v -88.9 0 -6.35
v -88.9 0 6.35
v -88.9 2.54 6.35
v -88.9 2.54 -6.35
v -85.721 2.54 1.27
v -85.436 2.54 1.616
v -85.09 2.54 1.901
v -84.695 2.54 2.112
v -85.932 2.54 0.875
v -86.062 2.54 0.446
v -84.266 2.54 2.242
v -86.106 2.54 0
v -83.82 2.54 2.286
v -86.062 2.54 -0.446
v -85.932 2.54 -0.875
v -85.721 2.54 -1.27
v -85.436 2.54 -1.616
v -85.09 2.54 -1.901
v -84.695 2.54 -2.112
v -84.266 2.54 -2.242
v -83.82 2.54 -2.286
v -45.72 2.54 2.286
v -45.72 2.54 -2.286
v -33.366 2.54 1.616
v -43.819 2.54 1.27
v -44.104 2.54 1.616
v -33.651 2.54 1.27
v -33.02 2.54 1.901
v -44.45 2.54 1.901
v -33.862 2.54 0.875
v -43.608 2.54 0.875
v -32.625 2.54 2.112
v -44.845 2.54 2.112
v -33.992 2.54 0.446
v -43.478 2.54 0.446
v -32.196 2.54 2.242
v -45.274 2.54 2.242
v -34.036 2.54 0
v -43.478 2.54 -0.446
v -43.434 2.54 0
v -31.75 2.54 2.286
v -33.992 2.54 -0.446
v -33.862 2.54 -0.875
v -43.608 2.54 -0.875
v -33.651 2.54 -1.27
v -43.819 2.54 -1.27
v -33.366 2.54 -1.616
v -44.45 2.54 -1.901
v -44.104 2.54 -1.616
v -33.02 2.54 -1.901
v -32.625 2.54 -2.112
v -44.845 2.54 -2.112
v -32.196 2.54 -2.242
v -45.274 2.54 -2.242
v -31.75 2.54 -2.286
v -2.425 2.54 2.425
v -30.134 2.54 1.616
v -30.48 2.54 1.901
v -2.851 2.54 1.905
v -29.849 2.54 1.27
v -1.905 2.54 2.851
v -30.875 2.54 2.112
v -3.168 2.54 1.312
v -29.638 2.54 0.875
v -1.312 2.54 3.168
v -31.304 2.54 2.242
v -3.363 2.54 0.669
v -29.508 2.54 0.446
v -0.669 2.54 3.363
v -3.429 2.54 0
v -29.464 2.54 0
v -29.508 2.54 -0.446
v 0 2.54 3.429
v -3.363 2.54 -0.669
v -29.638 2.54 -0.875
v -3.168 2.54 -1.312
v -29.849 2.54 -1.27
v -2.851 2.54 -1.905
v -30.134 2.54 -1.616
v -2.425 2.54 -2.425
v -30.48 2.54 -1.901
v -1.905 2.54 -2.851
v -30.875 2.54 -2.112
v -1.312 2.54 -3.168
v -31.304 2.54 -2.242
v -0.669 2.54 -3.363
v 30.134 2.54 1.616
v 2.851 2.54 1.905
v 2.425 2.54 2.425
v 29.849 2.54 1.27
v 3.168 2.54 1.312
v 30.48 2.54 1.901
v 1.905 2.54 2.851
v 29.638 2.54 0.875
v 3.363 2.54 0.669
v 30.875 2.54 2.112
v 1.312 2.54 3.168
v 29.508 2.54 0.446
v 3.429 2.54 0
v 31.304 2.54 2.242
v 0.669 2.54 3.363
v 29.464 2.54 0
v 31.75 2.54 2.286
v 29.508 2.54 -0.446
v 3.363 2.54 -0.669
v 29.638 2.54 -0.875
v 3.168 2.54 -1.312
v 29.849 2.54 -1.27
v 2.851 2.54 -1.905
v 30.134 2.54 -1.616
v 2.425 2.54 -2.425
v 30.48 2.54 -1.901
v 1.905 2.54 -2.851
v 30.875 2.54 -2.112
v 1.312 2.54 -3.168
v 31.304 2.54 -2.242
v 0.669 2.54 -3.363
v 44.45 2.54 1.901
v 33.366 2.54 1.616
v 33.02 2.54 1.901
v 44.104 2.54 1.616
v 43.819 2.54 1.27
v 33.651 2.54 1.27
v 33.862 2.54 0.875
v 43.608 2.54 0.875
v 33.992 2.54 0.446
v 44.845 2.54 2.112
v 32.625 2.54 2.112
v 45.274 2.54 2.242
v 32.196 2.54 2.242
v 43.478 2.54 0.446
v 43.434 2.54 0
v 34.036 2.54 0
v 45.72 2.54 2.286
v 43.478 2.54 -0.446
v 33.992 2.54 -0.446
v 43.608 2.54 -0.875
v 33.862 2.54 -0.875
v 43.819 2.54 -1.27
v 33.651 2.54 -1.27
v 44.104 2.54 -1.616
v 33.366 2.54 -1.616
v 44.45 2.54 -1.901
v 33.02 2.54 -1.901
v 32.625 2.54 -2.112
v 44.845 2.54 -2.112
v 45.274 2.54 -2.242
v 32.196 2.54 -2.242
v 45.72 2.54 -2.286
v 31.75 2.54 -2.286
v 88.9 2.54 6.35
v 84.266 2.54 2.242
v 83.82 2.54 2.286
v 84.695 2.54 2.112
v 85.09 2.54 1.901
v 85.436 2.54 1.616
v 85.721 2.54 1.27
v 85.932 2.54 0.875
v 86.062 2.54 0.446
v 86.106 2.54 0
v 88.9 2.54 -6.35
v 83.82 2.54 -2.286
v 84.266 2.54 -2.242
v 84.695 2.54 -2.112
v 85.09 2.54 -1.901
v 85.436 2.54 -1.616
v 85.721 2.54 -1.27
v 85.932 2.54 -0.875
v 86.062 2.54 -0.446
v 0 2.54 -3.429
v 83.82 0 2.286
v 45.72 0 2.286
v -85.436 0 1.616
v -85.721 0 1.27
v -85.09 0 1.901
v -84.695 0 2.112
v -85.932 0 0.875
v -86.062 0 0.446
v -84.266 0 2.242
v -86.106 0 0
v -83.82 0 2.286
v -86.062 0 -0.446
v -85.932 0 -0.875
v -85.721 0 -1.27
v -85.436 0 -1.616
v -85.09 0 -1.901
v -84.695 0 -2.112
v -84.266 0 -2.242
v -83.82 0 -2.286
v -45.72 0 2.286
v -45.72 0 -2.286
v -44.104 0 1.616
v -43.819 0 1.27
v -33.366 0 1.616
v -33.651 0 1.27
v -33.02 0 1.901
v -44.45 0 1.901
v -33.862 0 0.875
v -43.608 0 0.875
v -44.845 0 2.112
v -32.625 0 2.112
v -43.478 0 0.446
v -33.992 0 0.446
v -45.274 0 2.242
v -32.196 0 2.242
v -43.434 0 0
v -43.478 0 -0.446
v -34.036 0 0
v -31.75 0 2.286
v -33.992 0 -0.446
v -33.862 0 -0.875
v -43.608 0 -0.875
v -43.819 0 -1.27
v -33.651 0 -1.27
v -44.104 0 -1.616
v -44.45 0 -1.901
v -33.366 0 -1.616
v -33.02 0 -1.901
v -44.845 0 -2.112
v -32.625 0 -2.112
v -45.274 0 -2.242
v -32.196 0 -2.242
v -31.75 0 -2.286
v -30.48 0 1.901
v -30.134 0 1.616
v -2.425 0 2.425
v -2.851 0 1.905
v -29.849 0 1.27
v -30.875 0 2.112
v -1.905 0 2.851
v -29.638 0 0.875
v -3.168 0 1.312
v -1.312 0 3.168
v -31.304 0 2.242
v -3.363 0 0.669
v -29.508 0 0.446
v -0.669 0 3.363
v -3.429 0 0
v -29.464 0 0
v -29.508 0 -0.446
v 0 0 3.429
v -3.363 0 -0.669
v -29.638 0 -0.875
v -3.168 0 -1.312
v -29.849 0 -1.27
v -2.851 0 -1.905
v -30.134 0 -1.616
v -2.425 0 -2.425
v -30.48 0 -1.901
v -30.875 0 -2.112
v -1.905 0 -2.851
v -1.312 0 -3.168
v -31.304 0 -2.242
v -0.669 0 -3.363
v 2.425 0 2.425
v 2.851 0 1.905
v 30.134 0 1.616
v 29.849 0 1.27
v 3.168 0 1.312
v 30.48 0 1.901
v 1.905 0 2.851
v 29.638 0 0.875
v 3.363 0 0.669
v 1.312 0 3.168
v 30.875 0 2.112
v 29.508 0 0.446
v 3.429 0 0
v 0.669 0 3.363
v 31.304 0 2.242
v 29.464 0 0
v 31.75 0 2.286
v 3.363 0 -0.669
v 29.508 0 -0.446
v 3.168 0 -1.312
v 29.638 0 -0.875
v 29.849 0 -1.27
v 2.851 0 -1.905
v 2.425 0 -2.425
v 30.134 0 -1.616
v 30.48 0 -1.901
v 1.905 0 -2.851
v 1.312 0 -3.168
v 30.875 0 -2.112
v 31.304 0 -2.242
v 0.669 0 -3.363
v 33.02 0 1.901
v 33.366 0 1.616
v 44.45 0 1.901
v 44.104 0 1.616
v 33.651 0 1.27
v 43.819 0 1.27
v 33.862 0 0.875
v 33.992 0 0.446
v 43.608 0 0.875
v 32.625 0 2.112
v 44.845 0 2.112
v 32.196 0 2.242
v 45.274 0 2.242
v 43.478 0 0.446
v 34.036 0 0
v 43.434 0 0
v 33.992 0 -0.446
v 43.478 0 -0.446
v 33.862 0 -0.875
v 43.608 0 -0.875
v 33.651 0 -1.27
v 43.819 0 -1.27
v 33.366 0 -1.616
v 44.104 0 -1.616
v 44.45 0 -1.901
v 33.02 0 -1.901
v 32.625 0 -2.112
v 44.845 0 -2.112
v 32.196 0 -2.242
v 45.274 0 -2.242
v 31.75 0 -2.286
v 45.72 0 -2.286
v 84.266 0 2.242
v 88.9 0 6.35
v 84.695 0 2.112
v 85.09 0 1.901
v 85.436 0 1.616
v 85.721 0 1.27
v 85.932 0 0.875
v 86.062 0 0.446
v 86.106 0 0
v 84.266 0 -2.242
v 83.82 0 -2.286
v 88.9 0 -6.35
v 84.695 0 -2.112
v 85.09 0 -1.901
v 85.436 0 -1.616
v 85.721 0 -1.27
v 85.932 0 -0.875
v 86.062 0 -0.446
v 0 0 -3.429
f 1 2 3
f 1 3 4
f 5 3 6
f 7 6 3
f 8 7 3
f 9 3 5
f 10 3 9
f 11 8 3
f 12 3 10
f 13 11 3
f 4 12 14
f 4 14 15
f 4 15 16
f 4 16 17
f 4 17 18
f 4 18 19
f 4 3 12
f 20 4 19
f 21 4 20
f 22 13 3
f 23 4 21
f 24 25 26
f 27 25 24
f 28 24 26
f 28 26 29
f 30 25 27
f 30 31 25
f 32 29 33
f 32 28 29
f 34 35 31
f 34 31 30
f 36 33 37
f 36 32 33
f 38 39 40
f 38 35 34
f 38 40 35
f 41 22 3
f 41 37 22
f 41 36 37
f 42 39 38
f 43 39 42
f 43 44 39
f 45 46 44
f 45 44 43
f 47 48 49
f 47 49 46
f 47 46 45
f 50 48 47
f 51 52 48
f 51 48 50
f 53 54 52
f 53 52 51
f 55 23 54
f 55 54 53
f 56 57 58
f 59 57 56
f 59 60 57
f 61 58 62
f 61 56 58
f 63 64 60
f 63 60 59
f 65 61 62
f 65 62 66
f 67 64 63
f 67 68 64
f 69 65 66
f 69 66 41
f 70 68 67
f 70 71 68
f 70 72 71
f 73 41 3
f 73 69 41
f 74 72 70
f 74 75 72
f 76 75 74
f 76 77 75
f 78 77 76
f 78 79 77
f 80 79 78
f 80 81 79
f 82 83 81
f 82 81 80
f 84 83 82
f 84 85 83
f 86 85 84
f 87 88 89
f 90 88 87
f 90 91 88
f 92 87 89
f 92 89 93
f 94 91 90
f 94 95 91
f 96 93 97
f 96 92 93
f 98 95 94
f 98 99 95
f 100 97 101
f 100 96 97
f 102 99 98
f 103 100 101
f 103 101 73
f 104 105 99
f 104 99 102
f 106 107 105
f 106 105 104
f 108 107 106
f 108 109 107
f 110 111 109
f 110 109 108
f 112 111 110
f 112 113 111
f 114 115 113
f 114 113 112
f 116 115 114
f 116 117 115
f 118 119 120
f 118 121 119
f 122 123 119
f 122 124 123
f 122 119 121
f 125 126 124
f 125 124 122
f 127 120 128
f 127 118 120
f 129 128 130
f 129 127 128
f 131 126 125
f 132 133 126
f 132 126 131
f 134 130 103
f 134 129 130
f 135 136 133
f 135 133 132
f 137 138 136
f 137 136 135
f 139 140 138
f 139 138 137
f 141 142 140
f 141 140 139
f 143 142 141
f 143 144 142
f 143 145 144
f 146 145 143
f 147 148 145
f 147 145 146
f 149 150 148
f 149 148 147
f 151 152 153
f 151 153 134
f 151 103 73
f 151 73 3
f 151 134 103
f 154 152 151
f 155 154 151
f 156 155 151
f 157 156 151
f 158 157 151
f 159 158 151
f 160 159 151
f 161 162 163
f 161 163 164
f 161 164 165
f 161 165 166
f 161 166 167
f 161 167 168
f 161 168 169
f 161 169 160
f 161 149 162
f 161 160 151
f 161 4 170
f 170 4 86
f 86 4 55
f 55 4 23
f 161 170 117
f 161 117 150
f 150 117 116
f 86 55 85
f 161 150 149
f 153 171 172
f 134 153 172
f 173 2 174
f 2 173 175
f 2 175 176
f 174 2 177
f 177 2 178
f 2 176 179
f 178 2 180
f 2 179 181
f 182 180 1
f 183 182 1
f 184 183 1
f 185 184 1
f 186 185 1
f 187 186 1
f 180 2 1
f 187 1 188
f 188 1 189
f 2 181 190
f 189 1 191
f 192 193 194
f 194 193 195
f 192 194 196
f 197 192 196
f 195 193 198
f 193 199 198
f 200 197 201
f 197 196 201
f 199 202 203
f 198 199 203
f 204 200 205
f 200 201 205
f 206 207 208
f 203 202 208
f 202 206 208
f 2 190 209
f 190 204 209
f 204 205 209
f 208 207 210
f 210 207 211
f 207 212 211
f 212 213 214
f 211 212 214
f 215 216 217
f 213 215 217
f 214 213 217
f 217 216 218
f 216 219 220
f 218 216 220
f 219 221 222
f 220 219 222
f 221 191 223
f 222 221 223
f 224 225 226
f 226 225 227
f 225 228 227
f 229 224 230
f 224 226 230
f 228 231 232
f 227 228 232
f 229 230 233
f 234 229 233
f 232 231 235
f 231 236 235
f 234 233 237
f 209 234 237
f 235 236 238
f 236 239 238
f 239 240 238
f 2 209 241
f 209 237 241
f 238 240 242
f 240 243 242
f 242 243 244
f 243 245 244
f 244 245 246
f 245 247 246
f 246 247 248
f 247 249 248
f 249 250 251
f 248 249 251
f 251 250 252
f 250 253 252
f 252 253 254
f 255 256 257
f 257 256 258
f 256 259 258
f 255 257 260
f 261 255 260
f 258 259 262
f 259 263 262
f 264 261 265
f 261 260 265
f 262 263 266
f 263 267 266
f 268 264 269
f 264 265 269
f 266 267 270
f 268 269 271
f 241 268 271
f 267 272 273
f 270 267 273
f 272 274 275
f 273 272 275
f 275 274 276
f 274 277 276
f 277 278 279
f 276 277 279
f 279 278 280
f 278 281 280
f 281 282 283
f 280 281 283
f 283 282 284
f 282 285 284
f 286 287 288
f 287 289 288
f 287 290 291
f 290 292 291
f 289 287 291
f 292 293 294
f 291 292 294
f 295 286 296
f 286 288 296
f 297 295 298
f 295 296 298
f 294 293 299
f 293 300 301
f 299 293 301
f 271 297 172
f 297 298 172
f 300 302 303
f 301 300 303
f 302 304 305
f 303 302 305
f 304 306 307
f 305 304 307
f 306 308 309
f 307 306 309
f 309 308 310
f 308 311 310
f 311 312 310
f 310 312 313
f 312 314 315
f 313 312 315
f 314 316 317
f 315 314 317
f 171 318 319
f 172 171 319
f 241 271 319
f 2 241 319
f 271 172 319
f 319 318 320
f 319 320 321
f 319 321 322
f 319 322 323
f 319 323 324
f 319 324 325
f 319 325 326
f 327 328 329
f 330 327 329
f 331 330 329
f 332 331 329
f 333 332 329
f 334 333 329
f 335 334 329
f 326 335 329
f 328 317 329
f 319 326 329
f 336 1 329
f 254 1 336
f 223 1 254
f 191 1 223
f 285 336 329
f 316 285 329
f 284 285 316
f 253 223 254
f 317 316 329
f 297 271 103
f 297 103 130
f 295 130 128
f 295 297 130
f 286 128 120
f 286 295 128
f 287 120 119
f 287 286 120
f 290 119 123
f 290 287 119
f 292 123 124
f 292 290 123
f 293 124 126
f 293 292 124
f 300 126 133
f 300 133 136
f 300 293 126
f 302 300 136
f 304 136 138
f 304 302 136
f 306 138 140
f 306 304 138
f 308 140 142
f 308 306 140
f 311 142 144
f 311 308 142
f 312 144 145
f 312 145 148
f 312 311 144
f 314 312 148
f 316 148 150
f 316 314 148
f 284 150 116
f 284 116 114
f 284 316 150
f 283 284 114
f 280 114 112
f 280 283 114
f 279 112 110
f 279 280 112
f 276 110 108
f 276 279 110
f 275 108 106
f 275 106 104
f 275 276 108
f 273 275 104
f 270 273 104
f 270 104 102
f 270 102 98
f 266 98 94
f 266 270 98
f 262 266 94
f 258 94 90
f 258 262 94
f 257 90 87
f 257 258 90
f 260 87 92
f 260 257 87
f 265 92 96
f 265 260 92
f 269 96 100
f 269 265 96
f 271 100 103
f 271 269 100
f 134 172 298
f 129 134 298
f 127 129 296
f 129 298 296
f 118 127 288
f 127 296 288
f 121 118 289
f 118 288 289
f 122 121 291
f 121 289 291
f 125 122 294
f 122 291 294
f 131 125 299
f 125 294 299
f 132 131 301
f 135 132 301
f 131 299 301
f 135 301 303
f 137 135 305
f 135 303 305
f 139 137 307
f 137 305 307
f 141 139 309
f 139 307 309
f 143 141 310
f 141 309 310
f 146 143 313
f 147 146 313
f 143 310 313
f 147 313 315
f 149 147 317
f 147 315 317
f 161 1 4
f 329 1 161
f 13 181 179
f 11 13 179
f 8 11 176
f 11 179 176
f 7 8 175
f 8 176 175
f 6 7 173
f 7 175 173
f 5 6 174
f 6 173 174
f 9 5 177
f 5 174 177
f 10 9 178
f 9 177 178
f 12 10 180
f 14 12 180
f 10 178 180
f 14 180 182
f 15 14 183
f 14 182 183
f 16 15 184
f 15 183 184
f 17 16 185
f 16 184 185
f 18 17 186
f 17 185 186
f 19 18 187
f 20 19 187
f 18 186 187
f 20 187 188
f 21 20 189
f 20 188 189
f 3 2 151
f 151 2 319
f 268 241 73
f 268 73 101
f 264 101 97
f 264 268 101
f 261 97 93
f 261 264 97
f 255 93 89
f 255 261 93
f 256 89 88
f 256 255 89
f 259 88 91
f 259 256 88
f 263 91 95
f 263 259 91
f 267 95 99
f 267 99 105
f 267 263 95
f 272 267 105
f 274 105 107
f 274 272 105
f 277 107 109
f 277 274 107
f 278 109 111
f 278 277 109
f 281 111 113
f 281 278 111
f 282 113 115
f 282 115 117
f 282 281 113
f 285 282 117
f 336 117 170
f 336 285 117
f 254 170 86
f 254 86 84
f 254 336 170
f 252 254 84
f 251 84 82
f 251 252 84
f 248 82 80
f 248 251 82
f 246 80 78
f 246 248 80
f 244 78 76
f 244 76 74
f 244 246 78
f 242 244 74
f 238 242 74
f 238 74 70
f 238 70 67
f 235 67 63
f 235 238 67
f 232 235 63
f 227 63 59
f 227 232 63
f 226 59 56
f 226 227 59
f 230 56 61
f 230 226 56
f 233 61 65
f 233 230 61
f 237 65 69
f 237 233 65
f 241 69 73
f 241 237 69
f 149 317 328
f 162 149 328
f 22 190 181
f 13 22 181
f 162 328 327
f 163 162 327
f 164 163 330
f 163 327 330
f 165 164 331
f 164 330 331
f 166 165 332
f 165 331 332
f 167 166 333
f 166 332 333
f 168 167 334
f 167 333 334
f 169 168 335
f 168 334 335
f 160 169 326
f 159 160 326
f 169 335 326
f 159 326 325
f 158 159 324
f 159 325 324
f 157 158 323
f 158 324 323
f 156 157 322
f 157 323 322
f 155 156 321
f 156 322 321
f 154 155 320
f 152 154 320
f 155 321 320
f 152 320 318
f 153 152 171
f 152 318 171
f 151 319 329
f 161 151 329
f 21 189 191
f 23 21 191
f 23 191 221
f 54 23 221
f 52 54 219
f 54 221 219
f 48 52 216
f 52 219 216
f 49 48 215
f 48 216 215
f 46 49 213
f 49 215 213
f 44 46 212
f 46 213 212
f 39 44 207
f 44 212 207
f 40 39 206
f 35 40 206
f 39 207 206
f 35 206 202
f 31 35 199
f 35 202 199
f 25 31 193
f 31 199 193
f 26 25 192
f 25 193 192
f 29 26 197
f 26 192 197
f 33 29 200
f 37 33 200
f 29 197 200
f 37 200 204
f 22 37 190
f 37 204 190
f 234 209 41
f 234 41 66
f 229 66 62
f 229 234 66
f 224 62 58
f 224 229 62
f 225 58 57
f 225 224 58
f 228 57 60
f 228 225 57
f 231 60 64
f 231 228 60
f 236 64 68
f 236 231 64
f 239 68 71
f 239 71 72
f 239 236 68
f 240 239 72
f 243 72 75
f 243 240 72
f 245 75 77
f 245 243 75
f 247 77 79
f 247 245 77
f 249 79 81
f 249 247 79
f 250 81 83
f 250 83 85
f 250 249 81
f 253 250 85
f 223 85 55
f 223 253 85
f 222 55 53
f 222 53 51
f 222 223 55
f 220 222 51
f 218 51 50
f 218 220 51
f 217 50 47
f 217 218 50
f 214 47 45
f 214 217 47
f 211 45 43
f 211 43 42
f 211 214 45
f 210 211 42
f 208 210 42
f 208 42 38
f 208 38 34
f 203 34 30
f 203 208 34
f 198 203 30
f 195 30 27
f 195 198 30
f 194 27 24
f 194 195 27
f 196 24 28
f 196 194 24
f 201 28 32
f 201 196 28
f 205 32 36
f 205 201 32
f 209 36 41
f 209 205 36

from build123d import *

# Parameters (mm, degrees)
SKETCH1_W           = 177.8
SKETCH1_H           = 12.7
SKETCH1_R           = 3.429
SKETCH1_R_2         = 2.286
BOSS_EXTRUDE1_DEPTH = 2.54


with BuildPart() as part:
    # Sketch1 → Boss-Extrude1 (new body)
    with BuildSketch(Plane(origin=(0, 0, 0), x_dir=(1, 0, 0), z_dir=(0, 1, 0))):
        Rectangle(SKETCH1_W, SKETCH1_H)
        with Locations(Location((0, 0, 0), (0, 0, 270))):
            Circle(SKETCH1_R, mode=Mode.SUBTRACT)
        with Locations(Location((-31.75, 0, 0), (0, 0, 270))):
            Circle(SKETCH1_R_2, mode=Mode.SUBTRACT)
        with Locations(Location((31.75, 0, 0), (0, 0, 270))):
            Circle(SKETCH1_R_2, mode=Mode.SUBTRACT)
        with BuildLine():
            Line((-83.82, 2.286), (-45.72, 2.286))
            ThreePointArc((-45.72, 2.286), (-43.434, 0), (-45.72, -2.286))
            Line((-45.72, -2.286), (-83.82, -2.286))
            ThreePointArc((-83.82, -2.286), (-86.106, 0), (-83.82, 2.286))
        make_face(mode=Mode.SUBTRACT)
        with BuildLine():
            Line((83.82, -2.286), (45.72, -2.286))
            ThreePointArc((45.72, -2.286), (43.434, 0), (45.72, 2.286))
            Line((45.72, 2.286), (83.82, 2.286))
            ThreePointArc((83.82, 2.286), (86.106, 0), (83.82, -2.286))
        make_face(mode=Mode.SUBTRACT)
    extrude(amount=BOSS_EXTRUDE1_DEPTH)


solid = part.part
